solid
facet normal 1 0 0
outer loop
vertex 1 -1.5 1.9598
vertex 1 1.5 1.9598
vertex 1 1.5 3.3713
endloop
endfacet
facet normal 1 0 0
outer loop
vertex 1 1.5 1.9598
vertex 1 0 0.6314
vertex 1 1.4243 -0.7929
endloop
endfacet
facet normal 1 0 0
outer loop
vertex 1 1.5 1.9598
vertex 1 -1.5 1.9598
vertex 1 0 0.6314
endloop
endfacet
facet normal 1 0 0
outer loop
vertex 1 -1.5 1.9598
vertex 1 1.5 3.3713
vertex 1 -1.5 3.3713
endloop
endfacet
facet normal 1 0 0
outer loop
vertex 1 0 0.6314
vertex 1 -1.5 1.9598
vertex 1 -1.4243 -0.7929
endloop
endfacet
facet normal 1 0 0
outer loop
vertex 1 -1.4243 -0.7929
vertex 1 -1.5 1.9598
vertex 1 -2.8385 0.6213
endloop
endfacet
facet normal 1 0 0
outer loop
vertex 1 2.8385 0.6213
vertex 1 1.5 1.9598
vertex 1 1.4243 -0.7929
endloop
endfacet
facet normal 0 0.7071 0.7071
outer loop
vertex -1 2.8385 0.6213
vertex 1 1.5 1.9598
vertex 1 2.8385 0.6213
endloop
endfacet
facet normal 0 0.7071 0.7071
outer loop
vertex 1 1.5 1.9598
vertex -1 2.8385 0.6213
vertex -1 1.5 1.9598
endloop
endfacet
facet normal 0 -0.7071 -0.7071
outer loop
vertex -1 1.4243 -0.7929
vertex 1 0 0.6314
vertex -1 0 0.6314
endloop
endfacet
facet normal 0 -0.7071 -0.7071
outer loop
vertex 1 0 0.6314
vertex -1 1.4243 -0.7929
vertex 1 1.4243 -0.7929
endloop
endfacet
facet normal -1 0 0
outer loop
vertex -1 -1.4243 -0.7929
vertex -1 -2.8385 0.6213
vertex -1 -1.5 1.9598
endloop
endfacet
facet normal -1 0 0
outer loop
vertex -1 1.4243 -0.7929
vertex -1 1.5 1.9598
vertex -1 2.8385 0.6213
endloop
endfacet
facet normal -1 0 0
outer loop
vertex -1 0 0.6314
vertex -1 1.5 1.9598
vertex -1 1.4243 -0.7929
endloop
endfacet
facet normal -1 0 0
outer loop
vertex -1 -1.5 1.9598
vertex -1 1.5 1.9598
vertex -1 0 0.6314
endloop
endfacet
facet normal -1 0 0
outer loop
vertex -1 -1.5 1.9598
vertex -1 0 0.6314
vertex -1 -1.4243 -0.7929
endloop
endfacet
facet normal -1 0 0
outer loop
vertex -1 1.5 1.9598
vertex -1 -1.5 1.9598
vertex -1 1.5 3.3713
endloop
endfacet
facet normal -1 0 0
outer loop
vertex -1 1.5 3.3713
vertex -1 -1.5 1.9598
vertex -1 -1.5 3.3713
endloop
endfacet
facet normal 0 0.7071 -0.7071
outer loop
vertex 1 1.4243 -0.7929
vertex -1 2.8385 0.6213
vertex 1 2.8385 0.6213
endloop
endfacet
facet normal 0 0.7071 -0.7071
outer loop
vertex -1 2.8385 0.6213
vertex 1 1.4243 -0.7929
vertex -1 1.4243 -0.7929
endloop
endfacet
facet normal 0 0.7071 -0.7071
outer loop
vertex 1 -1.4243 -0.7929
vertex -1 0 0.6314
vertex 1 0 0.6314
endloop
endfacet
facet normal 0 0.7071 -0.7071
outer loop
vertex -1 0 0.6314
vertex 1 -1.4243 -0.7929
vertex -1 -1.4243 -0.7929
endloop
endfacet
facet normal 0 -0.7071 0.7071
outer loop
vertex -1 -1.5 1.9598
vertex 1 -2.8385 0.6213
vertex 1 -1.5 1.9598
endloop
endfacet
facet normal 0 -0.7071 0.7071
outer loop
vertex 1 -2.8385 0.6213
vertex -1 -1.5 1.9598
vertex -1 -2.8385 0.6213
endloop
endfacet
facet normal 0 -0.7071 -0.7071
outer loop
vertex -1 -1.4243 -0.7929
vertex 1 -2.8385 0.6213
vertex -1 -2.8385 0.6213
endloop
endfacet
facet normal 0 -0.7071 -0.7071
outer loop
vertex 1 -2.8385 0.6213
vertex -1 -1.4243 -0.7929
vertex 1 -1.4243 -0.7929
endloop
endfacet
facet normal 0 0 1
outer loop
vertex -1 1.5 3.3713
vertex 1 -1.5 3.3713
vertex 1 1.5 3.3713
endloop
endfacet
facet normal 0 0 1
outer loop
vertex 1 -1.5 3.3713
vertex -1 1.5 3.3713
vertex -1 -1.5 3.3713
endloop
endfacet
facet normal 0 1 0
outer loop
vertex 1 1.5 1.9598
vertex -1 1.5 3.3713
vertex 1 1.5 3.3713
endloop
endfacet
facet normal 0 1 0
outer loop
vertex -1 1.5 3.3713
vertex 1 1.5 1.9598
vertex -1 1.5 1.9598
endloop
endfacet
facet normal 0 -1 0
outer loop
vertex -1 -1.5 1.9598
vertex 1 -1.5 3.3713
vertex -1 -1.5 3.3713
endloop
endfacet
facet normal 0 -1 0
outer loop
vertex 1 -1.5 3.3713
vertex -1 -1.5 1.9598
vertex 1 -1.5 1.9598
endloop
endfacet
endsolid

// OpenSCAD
$fn=64;
translate(v = [0, 0, 0.9142135623730951])
union(){translate(v = [0, 1.131370849898476])
rotate(a = [-45, 0, 0])
translate(v = [0, 0, -1.0])
translate(v = [-1.0, -1.4142135623730951])
cube(size = [2, 2.8284271247461903, 2]);
translate(v = [0, -1.131370849898476])
rotate(a = [45, 0, 0])
translate(v = [0, 0, -1.0])
translate(v = [-1.0, -1.4142135623730951])
cube(size = [2, 2.8284271247461903, 2]);
translate(v = [0, 0, 0.4571067811865476])
translate(v = [-1.0, -1.5])
cube(size = [2, 3.0, 2]);
}
